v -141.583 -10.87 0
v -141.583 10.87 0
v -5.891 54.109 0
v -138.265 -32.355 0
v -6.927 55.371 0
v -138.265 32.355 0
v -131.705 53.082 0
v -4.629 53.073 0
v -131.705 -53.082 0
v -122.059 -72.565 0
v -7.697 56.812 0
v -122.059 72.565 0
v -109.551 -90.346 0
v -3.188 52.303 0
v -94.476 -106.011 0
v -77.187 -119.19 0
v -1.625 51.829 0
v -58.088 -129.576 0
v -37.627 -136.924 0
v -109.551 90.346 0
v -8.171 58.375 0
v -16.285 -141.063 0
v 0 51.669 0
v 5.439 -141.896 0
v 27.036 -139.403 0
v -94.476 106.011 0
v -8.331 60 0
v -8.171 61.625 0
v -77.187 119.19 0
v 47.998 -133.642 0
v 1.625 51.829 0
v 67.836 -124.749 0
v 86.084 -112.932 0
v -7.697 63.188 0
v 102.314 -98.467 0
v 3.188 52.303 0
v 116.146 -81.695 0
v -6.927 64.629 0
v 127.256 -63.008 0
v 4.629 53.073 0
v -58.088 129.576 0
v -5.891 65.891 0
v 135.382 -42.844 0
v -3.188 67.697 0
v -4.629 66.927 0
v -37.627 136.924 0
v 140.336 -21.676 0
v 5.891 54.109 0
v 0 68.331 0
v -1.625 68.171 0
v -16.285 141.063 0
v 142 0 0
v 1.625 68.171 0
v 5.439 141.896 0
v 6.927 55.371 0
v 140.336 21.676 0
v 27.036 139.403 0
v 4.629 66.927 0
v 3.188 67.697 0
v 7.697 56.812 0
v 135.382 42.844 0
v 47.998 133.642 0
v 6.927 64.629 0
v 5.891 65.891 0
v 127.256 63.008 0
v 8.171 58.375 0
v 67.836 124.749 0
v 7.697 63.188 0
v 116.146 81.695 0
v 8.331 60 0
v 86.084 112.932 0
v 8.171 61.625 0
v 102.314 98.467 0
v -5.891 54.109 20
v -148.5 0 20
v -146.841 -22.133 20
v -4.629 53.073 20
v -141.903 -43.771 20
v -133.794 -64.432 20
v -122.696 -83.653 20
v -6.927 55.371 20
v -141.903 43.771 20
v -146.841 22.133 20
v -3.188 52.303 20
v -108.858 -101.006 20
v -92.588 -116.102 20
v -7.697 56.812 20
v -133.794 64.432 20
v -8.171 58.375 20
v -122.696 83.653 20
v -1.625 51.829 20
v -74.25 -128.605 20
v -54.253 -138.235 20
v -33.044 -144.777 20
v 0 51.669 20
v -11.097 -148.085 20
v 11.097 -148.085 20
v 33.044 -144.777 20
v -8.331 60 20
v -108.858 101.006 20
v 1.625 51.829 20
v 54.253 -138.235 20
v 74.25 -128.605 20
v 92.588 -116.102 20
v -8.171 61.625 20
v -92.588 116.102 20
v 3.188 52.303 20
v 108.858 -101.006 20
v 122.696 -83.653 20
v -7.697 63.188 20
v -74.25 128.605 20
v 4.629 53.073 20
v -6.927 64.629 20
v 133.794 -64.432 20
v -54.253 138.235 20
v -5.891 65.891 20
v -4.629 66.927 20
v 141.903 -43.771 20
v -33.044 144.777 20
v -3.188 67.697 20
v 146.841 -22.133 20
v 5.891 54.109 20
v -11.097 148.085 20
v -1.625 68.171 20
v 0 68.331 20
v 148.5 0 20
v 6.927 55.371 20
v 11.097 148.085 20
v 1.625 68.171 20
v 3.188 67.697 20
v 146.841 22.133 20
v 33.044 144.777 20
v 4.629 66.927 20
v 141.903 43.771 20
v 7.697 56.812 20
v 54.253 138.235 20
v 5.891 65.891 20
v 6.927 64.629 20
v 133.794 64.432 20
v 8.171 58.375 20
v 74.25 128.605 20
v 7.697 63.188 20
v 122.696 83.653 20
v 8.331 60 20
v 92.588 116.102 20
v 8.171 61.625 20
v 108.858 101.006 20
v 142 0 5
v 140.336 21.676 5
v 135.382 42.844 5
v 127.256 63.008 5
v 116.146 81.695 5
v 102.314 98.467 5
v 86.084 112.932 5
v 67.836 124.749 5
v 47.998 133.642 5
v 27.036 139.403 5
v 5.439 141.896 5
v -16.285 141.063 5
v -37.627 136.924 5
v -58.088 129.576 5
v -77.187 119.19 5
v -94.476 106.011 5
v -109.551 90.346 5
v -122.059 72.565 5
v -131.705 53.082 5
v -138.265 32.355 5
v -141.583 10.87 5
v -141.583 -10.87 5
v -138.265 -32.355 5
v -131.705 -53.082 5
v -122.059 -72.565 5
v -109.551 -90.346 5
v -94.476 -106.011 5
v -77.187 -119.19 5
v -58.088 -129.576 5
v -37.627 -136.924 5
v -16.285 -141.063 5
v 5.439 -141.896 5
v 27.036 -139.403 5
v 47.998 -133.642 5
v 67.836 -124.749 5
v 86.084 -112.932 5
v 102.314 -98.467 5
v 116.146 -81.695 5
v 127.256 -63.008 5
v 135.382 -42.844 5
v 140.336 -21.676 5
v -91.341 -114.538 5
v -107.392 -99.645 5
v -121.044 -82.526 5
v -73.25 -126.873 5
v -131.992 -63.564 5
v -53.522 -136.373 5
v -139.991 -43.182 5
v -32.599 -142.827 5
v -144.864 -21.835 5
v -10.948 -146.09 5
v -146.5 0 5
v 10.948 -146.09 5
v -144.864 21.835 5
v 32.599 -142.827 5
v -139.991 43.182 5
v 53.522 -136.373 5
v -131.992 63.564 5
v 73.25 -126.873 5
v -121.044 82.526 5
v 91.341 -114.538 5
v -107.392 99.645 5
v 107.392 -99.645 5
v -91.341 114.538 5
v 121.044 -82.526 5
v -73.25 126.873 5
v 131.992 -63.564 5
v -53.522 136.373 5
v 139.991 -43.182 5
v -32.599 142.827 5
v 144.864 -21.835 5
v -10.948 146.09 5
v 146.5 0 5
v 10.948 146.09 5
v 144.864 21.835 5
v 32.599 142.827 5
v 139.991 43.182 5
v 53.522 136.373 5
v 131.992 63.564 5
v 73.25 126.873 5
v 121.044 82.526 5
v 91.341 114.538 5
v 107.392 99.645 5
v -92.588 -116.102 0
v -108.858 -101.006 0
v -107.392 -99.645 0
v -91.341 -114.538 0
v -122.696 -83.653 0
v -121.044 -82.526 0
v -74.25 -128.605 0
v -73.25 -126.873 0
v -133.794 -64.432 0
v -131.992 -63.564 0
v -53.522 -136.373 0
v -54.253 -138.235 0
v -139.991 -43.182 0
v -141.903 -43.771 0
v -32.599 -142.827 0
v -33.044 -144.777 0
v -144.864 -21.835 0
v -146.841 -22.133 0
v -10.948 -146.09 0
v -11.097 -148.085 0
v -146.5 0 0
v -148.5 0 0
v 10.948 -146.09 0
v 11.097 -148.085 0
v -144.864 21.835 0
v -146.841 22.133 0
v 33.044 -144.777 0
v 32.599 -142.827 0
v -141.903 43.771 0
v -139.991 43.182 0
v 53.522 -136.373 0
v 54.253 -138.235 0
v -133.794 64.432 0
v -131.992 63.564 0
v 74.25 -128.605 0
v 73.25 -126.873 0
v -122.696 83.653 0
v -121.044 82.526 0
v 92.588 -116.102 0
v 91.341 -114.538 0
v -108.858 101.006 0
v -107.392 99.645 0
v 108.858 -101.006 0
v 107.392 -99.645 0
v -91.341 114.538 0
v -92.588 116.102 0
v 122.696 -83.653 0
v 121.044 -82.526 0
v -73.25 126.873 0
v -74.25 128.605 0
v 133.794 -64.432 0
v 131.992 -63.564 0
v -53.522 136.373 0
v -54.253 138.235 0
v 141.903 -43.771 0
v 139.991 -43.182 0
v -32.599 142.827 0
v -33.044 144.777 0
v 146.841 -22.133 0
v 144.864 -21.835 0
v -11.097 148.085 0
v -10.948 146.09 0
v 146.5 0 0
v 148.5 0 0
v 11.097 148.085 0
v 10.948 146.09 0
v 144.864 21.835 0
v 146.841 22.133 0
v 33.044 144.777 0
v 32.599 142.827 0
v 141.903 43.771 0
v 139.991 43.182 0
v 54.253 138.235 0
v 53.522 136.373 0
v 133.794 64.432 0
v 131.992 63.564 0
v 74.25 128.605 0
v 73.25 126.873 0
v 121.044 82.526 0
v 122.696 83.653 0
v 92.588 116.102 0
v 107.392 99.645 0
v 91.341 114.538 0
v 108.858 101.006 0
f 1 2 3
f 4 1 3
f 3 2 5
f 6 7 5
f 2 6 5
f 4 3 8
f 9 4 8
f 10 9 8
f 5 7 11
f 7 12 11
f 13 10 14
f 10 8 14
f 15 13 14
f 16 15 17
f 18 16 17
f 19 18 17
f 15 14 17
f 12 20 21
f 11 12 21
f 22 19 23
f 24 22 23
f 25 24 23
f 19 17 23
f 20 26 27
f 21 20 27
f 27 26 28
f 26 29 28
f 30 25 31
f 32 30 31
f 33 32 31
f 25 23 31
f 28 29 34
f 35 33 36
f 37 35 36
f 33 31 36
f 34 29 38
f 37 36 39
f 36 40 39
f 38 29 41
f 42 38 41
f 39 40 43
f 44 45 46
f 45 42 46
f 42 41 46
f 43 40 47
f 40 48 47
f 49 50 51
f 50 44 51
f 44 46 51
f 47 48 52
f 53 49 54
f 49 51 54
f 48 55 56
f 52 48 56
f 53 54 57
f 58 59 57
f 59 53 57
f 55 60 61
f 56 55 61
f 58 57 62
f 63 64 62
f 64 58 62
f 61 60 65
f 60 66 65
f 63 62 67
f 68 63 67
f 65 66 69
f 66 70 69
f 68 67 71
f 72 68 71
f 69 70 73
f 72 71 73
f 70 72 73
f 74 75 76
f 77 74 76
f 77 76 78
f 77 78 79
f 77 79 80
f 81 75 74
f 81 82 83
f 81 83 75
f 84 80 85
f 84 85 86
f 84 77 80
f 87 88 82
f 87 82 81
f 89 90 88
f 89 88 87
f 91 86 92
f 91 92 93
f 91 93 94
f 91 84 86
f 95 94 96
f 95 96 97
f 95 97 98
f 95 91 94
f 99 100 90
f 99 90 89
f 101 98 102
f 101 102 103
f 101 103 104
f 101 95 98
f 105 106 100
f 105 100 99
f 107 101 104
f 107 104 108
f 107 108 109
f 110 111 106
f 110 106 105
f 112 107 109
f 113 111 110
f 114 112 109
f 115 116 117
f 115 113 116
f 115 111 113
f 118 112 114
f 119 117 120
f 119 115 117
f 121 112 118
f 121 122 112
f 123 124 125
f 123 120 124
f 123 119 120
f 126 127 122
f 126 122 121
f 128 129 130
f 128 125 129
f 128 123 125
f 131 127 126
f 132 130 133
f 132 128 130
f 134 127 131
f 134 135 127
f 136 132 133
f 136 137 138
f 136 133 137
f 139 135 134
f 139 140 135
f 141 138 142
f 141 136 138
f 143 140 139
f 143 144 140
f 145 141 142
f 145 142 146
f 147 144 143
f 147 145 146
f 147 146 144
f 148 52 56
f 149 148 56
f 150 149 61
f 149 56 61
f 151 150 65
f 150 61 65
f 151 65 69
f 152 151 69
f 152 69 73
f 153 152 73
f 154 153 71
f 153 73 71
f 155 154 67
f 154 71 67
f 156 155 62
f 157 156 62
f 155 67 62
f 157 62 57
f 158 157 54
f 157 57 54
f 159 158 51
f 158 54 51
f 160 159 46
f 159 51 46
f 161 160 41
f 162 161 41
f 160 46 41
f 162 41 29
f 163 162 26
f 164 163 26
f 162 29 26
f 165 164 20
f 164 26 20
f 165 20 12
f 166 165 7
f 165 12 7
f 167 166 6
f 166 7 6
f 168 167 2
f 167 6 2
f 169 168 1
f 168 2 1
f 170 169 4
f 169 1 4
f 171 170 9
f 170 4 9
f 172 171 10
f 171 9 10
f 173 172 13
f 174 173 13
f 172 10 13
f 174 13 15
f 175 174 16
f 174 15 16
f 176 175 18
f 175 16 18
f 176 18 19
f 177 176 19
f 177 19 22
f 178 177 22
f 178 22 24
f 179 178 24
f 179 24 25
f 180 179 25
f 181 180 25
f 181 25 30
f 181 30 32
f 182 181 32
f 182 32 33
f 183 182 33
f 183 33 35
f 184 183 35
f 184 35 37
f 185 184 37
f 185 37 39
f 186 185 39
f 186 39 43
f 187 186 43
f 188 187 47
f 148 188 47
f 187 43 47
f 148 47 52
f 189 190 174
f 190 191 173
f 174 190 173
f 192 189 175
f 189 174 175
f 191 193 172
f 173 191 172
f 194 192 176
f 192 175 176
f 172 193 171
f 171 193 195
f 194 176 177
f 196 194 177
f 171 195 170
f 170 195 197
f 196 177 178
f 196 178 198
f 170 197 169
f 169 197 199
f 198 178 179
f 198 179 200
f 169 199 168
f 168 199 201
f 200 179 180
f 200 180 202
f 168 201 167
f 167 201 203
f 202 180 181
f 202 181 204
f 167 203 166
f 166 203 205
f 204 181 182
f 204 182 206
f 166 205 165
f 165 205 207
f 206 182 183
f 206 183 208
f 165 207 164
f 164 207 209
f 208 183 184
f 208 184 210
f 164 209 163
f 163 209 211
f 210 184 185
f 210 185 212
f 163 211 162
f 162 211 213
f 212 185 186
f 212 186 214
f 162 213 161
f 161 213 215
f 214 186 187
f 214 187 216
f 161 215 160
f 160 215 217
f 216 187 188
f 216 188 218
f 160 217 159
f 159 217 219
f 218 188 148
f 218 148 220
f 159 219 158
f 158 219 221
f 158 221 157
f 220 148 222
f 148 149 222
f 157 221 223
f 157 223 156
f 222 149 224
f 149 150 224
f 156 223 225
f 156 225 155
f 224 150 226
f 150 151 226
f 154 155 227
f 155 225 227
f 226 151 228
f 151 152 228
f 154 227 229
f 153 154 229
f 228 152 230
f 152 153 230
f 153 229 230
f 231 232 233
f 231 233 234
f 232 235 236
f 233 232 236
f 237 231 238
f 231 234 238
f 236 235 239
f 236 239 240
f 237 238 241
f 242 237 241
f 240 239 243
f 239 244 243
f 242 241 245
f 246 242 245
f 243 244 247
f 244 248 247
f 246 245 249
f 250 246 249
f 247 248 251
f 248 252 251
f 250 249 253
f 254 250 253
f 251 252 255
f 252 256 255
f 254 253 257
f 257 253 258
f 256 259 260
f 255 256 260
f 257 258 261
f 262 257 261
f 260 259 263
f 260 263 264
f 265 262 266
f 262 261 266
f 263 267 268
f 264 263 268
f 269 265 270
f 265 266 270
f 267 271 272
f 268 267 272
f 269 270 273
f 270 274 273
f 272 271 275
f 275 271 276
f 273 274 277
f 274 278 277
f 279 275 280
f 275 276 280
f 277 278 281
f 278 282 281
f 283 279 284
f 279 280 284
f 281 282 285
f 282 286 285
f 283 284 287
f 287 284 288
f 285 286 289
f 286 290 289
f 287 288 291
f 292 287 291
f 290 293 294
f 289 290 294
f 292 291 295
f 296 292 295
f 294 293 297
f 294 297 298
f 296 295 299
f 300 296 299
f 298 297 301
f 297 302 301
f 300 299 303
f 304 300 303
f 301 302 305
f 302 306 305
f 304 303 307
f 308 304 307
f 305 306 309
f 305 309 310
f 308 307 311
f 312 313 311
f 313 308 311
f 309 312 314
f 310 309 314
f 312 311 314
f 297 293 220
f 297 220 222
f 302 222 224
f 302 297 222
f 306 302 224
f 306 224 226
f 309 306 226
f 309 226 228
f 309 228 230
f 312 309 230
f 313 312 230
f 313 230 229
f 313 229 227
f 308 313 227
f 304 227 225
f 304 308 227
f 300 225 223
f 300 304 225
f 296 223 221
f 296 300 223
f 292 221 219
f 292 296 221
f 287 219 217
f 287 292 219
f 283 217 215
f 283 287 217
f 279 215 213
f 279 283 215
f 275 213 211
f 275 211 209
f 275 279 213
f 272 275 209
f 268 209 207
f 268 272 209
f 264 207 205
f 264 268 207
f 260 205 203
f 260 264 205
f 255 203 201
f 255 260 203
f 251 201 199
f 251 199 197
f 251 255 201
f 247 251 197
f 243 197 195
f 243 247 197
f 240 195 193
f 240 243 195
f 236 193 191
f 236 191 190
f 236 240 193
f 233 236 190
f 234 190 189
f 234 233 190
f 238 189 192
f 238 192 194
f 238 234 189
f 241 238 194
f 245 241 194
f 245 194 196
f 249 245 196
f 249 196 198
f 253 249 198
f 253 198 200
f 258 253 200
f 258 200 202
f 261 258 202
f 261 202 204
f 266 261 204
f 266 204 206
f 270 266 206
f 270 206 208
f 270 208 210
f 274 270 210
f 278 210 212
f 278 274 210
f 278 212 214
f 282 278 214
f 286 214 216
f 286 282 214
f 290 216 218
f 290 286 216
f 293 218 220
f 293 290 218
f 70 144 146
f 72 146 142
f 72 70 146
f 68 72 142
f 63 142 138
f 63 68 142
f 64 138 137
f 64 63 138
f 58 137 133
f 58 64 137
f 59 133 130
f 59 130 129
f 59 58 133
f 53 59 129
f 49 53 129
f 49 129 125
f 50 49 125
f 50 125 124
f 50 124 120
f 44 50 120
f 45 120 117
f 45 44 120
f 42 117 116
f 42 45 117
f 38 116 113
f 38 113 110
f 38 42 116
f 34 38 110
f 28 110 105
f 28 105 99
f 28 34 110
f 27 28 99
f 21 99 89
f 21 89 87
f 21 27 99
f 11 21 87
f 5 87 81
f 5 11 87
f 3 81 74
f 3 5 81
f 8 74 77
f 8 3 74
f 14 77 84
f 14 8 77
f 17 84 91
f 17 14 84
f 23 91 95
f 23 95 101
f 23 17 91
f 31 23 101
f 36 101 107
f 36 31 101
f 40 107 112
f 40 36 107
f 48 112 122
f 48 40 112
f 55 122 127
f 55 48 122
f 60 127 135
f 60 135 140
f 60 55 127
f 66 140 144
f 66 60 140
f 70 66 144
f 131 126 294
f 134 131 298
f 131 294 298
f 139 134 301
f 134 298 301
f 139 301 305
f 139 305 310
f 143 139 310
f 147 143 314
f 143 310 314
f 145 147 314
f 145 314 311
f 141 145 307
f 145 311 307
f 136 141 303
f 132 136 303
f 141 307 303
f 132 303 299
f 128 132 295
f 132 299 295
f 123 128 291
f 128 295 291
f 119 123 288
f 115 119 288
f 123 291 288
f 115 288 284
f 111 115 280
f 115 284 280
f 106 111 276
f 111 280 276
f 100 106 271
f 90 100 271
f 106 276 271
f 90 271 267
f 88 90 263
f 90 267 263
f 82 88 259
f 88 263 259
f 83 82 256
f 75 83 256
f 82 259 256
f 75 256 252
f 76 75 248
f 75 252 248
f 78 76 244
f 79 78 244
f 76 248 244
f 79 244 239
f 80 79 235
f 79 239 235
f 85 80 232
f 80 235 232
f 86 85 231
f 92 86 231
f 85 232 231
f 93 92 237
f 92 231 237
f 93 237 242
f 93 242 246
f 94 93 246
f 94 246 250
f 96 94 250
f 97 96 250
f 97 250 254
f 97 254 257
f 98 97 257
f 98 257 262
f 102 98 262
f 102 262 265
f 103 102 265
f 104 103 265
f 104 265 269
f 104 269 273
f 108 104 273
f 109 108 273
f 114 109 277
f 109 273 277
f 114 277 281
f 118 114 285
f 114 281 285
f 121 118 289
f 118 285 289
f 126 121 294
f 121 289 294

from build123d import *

# Parameters (mm, degrees)
F0_R     = 148.5
F0_R_2   = 8.3312
F1_DEPTH = 20
F2_R     = 146.5
F2_R_2   = 142
F3_DEPTH = 5


# Not quite as in the source:
# - a feature names something its author has since deleted; it is built from what else it names


with BuildPart() as f1:
    # F0 (on Top) → F1 (new body)
    with BuildSketch(Plane.XY):
        Circle(F0_R)
        with Locations((0, 60)):
            Circle(F0_R_2, mode=Mode.SUBTRACT)
    extrude(amount=F1_DEPTH)

    # F2 (on face) → F3 (cut)
    with BuildSketch(Plane.XY):
        Circle(F2_R)
        Circle(F2_R_2, mode=Mode.SUBTRACT)
    extrude(amount=F3_DEPTH, mode=Mode.SUBTRACT)


solid = f1.part
